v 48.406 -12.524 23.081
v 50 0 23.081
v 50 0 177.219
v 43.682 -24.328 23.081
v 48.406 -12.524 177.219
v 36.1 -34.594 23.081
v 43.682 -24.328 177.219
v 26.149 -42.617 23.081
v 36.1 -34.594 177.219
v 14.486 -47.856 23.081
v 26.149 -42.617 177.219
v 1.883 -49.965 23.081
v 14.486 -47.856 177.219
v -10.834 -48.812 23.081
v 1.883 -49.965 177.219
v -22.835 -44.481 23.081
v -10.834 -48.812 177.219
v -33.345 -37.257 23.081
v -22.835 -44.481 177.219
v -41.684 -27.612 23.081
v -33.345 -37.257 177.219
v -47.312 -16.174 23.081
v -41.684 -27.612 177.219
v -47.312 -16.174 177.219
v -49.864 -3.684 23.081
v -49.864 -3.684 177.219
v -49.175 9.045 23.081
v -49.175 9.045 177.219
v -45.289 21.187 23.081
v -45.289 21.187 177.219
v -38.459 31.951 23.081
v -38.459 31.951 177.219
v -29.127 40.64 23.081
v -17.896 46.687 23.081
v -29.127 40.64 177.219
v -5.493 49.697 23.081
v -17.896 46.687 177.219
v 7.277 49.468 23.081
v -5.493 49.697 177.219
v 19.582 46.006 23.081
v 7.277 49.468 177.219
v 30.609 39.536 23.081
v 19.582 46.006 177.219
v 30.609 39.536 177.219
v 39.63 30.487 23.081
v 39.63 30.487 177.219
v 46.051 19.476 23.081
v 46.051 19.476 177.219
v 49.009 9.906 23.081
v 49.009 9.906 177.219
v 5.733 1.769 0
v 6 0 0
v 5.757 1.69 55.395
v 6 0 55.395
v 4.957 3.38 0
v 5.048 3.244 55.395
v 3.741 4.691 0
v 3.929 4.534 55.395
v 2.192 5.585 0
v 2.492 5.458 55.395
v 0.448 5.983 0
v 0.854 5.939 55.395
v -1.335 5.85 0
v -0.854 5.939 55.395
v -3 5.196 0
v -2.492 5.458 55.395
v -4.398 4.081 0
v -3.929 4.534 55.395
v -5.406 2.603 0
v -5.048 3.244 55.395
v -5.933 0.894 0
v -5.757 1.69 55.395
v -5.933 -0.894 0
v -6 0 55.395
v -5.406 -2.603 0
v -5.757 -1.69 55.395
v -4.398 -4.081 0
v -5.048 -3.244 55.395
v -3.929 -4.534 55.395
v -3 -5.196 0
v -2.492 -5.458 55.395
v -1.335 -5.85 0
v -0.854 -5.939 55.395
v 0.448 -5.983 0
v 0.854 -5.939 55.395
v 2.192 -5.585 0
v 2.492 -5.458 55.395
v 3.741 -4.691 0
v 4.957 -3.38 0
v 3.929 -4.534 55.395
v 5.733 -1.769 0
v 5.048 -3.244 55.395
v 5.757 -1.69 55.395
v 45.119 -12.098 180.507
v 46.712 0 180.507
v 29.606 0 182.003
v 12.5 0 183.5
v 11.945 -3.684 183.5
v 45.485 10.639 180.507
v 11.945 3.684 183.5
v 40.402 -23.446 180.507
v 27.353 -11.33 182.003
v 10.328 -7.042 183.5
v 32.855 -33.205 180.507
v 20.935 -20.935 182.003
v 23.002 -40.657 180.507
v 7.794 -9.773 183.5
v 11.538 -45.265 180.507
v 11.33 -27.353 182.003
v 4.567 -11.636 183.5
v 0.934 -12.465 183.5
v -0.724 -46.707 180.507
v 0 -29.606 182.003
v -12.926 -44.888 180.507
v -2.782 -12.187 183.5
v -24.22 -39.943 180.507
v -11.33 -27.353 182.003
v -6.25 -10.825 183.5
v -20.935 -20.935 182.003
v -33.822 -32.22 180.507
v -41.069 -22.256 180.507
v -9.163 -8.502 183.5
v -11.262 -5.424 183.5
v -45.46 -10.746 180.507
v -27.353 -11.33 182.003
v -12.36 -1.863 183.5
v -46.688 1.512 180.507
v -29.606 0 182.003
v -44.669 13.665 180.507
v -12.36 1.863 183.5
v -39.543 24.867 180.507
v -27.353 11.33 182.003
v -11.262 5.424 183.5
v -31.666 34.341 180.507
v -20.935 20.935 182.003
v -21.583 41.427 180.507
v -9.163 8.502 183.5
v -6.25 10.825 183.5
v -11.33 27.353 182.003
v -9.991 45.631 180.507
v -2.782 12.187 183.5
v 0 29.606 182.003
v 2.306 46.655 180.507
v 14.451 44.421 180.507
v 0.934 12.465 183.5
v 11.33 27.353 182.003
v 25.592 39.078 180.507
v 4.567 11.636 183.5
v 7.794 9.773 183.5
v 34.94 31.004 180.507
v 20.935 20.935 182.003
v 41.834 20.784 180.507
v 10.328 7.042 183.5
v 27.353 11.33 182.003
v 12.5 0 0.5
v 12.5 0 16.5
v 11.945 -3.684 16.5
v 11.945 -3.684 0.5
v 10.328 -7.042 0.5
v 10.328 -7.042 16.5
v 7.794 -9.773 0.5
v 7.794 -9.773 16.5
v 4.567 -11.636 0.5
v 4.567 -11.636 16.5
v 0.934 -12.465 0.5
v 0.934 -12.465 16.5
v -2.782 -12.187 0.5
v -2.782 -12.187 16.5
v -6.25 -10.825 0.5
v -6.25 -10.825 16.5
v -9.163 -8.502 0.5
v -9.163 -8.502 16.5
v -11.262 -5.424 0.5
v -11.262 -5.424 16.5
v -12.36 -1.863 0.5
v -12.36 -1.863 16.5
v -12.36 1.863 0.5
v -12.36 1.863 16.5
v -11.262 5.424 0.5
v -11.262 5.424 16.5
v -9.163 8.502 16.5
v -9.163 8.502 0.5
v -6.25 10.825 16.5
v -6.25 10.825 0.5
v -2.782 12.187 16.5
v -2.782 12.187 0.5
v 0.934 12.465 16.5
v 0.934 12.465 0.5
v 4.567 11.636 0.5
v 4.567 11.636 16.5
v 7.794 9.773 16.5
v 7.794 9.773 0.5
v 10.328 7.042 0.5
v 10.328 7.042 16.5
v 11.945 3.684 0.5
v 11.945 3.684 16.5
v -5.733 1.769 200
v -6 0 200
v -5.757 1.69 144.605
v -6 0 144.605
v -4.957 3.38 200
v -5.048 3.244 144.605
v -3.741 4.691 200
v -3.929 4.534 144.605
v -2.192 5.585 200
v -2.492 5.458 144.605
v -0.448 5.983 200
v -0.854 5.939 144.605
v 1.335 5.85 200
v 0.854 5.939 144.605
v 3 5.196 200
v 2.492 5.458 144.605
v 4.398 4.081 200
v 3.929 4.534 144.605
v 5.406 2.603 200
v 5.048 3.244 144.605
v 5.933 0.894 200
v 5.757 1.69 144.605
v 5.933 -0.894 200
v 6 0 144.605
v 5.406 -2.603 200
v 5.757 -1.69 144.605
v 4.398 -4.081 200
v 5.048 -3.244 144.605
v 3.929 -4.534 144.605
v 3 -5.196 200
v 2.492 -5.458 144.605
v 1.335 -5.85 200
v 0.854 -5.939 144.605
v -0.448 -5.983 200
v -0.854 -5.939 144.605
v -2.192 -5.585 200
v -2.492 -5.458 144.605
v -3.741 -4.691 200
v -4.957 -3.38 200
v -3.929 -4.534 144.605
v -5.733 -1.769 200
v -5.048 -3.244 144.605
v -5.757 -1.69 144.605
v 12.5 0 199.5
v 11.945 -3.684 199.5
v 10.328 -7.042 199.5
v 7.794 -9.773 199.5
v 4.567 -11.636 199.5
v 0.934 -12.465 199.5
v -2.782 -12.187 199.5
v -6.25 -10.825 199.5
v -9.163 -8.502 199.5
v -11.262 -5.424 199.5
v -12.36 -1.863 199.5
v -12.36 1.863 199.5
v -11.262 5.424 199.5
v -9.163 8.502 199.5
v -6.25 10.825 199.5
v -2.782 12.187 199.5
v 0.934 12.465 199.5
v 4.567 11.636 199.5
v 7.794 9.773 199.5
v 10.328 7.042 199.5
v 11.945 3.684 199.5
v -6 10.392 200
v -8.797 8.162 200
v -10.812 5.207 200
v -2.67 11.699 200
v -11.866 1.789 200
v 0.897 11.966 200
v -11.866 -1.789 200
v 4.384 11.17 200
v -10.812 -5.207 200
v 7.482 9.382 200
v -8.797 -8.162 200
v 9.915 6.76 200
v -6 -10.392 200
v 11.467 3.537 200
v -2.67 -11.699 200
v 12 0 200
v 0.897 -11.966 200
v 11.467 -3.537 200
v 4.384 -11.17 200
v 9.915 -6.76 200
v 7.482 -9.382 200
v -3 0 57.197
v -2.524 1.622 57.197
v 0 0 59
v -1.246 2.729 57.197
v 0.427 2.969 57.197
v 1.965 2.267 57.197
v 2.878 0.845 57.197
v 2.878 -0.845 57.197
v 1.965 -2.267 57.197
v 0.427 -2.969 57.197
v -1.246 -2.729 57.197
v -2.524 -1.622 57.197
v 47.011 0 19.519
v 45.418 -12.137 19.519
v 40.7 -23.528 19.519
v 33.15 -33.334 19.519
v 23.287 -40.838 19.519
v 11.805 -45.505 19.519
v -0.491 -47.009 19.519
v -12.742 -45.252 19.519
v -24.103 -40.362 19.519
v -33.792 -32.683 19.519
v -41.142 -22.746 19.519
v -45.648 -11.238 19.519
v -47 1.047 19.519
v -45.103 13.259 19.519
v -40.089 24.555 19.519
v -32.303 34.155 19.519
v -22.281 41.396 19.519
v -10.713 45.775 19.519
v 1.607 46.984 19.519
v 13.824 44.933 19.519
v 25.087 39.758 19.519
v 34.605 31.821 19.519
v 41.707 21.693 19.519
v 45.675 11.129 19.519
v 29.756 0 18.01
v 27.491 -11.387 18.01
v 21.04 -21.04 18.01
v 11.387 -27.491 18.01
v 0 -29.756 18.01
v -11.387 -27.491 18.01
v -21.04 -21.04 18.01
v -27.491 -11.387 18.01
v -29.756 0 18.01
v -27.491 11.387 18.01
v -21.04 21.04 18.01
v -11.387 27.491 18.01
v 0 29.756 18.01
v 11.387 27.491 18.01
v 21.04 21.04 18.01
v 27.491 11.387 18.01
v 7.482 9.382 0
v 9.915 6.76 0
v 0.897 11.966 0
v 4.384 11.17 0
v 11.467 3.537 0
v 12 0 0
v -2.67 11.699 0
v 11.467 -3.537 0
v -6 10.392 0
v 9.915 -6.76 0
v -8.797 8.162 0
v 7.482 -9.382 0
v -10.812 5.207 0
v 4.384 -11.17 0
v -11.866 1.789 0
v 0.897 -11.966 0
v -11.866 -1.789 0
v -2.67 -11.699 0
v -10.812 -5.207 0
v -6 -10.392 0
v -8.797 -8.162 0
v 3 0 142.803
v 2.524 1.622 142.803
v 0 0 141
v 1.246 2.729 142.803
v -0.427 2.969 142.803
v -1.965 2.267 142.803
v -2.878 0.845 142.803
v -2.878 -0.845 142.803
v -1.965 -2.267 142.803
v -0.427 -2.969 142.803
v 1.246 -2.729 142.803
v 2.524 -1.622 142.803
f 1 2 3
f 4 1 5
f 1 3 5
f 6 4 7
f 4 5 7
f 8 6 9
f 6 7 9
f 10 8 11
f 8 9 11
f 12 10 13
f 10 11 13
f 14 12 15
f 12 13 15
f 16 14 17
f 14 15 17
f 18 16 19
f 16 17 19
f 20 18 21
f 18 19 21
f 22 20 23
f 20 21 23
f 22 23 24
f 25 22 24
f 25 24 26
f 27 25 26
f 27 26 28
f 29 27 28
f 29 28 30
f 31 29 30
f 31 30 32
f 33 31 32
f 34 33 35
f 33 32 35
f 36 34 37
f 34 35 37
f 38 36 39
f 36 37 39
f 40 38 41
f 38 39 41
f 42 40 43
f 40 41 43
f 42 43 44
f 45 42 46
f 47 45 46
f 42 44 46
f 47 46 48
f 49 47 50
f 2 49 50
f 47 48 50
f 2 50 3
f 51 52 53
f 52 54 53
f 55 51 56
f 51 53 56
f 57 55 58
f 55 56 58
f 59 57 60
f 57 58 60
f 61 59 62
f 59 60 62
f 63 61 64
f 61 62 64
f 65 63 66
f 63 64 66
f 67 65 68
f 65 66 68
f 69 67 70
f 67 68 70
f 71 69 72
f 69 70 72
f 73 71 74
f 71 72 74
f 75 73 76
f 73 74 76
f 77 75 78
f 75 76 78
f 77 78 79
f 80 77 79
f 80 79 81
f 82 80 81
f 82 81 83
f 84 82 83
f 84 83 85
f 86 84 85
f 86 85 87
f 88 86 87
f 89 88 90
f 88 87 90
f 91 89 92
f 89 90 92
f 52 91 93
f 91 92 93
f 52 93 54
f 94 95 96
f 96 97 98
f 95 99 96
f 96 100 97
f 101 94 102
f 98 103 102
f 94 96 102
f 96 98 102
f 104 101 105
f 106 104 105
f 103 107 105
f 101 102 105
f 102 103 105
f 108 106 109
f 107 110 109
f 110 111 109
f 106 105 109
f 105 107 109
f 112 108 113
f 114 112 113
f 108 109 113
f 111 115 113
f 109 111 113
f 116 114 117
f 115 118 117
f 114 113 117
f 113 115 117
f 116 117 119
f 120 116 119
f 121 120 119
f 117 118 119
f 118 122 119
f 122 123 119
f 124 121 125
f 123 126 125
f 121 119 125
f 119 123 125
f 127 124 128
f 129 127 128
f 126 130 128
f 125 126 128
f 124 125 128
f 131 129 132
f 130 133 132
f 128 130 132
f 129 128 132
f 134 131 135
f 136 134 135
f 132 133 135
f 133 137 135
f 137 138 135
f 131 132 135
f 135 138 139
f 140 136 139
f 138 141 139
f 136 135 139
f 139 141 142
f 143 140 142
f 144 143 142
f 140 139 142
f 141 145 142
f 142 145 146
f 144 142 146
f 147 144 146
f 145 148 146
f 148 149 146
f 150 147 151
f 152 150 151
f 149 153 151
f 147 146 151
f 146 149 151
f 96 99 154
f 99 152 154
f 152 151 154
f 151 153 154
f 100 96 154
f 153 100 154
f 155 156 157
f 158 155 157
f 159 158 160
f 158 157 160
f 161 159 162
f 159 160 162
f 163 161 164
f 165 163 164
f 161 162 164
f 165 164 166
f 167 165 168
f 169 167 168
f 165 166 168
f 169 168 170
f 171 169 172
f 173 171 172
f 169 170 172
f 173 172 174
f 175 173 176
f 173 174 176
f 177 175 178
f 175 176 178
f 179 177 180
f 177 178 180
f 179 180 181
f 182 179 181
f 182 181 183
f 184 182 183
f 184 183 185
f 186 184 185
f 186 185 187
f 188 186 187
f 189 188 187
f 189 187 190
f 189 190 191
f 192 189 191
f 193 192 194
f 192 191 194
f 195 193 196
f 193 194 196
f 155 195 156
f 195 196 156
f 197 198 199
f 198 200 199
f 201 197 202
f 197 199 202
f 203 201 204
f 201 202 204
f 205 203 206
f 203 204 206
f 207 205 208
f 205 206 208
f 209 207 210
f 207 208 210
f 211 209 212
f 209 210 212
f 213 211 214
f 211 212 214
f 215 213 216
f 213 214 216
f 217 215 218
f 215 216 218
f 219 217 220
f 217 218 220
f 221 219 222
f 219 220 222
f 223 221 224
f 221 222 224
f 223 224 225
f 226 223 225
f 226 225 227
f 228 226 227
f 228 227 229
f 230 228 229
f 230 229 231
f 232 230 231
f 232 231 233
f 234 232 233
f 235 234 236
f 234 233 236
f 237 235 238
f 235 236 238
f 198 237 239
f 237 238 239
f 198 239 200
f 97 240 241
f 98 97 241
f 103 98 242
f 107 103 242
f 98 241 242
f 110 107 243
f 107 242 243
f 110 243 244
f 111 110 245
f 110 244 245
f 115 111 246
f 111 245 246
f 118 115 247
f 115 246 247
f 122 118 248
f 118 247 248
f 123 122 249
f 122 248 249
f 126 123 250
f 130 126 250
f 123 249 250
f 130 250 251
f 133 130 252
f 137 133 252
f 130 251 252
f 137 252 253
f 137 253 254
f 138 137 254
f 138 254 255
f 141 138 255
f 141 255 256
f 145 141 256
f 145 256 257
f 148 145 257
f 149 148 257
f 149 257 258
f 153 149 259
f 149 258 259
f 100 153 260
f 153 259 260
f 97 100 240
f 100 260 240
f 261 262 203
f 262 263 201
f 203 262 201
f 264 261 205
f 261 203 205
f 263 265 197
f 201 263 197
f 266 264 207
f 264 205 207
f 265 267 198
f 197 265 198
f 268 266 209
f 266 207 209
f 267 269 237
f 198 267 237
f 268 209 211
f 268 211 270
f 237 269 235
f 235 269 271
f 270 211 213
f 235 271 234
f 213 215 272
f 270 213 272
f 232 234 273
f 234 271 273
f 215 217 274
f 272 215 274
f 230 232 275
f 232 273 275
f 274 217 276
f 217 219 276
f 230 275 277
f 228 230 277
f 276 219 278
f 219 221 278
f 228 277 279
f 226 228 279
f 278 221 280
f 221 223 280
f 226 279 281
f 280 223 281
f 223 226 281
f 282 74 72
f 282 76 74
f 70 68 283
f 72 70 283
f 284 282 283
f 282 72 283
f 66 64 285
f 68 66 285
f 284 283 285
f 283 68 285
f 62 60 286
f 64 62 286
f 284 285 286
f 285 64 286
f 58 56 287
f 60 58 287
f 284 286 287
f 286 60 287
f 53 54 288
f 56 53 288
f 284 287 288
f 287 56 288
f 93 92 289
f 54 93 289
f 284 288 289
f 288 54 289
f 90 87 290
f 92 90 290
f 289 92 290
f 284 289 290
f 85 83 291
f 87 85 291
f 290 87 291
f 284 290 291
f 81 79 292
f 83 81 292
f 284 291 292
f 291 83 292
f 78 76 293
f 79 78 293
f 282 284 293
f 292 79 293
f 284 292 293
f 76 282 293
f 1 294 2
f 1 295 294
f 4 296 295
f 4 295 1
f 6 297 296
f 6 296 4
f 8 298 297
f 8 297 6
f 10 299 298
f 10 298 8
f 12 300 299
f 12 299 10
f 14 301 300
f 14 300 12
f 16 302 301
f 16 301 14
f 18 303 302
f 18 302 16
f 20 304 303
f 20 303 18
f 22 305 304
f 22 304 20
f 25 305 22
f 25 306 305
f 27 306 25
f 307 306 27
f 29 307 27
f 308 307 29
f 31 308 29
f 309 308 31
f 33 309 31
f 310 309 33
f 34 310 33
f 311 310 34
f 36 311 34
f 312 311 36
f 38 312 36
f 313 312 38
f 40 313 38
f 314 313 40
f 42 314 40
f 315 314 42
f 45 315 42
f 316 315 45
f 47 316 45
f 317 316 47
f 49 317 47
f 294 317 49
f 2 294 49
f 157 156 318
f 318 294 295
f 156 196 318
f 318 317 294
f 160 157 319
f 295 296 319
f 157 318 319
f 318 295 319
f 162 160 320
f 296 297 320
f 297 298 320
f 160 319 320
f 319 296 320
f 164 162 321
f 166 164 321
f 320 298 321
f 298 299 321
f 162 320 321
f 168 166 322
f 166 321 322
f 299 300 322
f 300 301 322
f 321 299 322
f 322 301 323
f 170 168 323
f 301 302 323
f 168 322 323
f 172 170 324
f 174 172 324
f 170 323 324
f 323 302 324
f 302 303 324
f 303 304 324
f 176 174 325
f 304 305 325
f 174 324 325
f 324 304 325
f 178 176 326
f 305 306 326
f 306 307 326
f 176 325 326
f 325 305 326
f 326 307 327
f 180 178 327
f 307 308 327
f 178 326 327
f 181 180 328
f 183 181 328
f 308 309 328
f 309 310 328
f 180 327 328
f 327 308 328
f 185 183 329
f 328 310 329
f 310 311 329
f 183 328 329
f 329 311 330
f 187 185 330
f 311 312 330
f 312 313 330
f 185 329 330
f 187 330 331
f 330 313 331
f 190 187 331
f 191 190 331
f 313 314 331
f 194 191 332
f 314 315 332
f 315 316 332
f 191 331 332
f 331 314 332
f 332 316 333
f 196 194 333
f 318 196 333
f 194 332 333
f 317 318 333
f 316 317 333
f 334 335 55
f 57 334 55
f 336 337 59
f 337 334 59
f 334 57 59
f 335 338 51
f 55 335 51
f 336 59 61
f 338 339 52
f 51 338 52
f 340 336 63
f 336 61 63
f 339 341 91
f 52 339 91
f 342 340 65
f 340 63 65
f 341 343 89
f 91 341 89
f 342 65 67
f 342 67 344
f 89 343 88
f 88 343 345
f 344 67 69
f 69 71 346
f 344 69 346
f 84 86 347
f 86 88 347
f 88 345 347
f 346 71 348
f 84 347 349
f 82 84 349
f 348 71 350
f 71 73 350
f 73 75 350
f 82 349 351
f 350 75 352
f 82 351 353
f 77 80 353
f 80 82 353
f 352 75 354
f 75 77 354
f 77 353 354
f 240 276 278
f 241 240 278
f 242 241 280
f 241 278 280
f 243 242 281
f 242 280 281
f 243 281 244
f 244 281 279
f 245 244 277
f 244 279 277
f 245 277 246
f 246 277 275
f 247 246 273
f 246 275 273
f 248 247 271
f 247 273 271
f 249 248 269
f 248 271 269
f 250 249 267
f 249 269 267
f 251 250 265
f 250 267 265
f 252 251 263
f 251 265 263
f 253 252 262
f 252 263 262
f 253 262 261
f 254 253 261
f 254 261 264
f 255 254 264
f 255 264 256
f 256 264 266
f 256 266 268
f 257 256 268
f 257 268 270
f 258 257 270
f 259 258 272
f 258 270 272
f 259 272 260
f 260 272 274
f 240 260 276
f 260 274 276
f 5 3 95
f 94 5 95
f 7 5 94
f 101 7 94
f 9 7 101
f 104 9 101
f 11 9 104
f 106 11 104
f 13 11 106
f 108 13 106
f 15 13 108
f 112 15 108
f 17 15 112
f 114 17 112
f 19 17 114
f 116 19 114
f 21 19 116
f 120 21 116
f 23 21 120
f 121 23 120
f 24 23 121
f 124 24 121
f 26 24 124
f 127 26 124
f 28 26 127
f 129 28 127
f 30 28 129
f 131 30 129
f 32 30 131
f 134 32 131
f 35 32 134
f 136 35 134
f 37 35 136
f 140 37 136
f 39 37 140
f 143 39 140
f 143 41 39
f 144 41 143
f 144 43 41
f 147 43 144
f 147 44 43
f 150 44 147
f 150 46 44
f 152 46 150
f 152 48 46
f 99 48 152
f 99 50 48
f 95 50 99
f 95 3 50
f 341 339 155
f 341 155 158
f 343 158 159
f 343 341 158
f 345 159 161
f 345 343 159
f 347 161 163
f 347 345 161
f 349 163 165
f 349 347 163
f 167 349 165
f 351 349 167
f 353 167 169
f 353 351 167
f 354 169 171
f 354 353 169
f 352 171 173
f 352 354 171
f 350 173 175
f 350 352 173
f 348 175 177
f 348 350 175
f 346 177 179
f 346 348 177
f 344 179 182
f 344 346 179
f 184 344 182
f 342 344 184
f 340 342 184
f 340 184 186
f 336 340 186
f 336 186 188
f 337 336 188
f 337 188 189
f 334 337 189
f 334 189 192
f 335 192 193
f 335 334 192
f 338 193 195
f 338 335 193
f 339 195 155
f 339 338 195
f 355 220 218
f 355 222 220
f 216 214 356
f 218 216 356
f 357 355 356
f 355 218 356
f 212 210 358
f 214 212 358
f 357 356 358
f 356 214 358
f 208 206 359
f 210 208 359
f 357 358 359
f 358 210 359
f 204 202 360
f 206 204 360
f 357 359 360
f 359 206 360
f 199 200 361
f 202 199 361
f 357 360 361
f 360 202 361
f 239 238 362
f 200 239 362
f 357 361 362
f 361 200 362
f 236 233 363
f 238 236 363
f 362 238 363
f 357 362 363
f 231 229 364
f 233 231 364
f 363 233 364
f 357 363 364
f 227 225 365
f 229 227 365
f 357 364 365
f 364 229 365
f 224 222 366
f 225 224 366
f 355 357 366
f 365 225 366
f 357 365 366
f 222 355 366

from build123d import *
from OCP.BRepFilletAPI import BRepFilletAPI_MakeChamfer

# Parameters (mm, degrees)
CHAFL_N1_SIZE                     = 3
CHAFL_N1_SIZE2                    = 3.300188603
TALADRO_DE_MARGEN_PARA_M101_D     = 12
TALADRO_DE_MARGEN_PARA_M101_DEPTH = 55.394836286
TALADRO_DE_MARGEN_PARA_M101_TIP   = 3.605163714
TALADRO_DE_MARGEN_PARA_M102_D     = 12
TALADRO_DE_MARGEN_PARA_M102_DEPTH = 55.394836286
TALADRO_DE_MARGEN_PARA_M102_TIP   = 3.605163714
CHAFL_N2_SIZE                     = 0.5


with BuildPart() as part:
    # Croquis1 → Revolución2 (revolve)
    with BuildSketch(Plane(origin=(0, 0, 0), x_dir=(0, 0, -1), z_dir=(1, 0, 0)), mode=Mode.PRIVATE) as revoluci_n2_sk:
        Polygon((0, 0), (0, 12.5), (-16.5, 12.5), (-19.780824882, 50), (-180.219175118, 50), (-183.5, 12.5), (-200, 12.5), (-200, 0), align=None)
    revolve(revoluci_n2_sk.sketch.rotate(Axis((0, 0, 200), (0, 0, -1)), 90), axis=Axis((0, 0, 200), (0, 0, -1)))

    # Chaflán1: one chamfer whose edges measure the first distance from different faces: ONE call of the kernel's chamfer builder (chamfer() names one face for all edges)
    chafl_n1_edges_1 = [part.edges().sort_by_distance(p)[0] for p in [
        (-50, 0, 180.219175118),
    ]]
    chafl_n1_side_1 = [part.faces().sort_by_distance(p)[0] for p in [
        (-50, 0, 100),
    ]]
    chafl_n1_edges_2 = [part.edges().sort_by_distance(p)[0] for p in [
        (-50, 0, 19.780824882),
    ]]
    chafl_n1_side_2 = [part.faces().sort_by_distance(p)[0] for p in [
        (-31.25, 0, 18.140412441),
    ]]
    chafl_n1 = BRepFilletAPI_MakeChamfer(part.part.solid().wrapped)
    for e in chafl_n1_edges_1:
        chafl_n1.Add(CHAFL_N1_SIZE, CHAFL_N1_SIZE2, e.wrapped, chafl_n1_side_1[0].wrapped)  # the first distance lies on this face
    for e in chafl_n1_edges_2:
        chafl_n1.Add(CHAFL_N1_SIZE, CHAFL_N1_SIZE2, e.wrapped, chafl_n1_side_2[0].wrapped)  # the first distance lies on this face
    add(Compound.cast(chafl_n1.Shape()), mode=Mode.REPLACE)

    # Taladro de margen para M101
    with Locations(Plane(origin=(0, 0, 0), x_dir=(-1, 0, 0), z_dir=(0, 0, -1))):
        with Locations((0, 0)):
            Hole(TALADRO_DE_MARGEN_PARA_M101_D / 2, depth=TALADRO_DE_MARGEN_PARA_M101_DEPTH)
            with Locations((0, 0, -(TALADRO_DE_MARGEN_PARA_M101_DEPTH + TALADRO_DE_MARGEN_PARA_M101_TIP / 2))):  # 118° drill point
                Cone(0, TALADRO_DE_MARGEN_PARA_M101_D / 2, TALADRO_DE_MARGEN_PARA_M101_TIP, mode=Mode.SUBTRACT)

    # Taladro de margen para M102
    with Locations(Plane.XY.offset(200)):
        with Locations((0, 0)):
            Hole(TALADRO_DE_MARGEN_PARA_M102_D / 2, depth=TALADRO_DE_MARGEN_PARA_M102_DEPTH)
            with Locations((0, 0, -(TALADRO_DE_MARGEN_PARA_M102_DEPTH + TALADRO_DE_MARGEN_PARA_M102_TIP / 2))):  # 118° drill point
                Cone(0, TALADRO_DE_MARGEN_PARA_M102_D / 2, TALADRO_DE_MARGEN_PARA_M102_TIP, mode=Mode.SUBTRACT)

    # Chaflán2
    chafl_n2_edges = [part.edges().sort_by_distance(p)[0] for p in [
        (-12.5, 0, 200),
        (-12.5, 0, 0),
    ]]
    chamfer(chafl_n2_edges, length=CHAFL_N2_SIZE)


solid = part.part
